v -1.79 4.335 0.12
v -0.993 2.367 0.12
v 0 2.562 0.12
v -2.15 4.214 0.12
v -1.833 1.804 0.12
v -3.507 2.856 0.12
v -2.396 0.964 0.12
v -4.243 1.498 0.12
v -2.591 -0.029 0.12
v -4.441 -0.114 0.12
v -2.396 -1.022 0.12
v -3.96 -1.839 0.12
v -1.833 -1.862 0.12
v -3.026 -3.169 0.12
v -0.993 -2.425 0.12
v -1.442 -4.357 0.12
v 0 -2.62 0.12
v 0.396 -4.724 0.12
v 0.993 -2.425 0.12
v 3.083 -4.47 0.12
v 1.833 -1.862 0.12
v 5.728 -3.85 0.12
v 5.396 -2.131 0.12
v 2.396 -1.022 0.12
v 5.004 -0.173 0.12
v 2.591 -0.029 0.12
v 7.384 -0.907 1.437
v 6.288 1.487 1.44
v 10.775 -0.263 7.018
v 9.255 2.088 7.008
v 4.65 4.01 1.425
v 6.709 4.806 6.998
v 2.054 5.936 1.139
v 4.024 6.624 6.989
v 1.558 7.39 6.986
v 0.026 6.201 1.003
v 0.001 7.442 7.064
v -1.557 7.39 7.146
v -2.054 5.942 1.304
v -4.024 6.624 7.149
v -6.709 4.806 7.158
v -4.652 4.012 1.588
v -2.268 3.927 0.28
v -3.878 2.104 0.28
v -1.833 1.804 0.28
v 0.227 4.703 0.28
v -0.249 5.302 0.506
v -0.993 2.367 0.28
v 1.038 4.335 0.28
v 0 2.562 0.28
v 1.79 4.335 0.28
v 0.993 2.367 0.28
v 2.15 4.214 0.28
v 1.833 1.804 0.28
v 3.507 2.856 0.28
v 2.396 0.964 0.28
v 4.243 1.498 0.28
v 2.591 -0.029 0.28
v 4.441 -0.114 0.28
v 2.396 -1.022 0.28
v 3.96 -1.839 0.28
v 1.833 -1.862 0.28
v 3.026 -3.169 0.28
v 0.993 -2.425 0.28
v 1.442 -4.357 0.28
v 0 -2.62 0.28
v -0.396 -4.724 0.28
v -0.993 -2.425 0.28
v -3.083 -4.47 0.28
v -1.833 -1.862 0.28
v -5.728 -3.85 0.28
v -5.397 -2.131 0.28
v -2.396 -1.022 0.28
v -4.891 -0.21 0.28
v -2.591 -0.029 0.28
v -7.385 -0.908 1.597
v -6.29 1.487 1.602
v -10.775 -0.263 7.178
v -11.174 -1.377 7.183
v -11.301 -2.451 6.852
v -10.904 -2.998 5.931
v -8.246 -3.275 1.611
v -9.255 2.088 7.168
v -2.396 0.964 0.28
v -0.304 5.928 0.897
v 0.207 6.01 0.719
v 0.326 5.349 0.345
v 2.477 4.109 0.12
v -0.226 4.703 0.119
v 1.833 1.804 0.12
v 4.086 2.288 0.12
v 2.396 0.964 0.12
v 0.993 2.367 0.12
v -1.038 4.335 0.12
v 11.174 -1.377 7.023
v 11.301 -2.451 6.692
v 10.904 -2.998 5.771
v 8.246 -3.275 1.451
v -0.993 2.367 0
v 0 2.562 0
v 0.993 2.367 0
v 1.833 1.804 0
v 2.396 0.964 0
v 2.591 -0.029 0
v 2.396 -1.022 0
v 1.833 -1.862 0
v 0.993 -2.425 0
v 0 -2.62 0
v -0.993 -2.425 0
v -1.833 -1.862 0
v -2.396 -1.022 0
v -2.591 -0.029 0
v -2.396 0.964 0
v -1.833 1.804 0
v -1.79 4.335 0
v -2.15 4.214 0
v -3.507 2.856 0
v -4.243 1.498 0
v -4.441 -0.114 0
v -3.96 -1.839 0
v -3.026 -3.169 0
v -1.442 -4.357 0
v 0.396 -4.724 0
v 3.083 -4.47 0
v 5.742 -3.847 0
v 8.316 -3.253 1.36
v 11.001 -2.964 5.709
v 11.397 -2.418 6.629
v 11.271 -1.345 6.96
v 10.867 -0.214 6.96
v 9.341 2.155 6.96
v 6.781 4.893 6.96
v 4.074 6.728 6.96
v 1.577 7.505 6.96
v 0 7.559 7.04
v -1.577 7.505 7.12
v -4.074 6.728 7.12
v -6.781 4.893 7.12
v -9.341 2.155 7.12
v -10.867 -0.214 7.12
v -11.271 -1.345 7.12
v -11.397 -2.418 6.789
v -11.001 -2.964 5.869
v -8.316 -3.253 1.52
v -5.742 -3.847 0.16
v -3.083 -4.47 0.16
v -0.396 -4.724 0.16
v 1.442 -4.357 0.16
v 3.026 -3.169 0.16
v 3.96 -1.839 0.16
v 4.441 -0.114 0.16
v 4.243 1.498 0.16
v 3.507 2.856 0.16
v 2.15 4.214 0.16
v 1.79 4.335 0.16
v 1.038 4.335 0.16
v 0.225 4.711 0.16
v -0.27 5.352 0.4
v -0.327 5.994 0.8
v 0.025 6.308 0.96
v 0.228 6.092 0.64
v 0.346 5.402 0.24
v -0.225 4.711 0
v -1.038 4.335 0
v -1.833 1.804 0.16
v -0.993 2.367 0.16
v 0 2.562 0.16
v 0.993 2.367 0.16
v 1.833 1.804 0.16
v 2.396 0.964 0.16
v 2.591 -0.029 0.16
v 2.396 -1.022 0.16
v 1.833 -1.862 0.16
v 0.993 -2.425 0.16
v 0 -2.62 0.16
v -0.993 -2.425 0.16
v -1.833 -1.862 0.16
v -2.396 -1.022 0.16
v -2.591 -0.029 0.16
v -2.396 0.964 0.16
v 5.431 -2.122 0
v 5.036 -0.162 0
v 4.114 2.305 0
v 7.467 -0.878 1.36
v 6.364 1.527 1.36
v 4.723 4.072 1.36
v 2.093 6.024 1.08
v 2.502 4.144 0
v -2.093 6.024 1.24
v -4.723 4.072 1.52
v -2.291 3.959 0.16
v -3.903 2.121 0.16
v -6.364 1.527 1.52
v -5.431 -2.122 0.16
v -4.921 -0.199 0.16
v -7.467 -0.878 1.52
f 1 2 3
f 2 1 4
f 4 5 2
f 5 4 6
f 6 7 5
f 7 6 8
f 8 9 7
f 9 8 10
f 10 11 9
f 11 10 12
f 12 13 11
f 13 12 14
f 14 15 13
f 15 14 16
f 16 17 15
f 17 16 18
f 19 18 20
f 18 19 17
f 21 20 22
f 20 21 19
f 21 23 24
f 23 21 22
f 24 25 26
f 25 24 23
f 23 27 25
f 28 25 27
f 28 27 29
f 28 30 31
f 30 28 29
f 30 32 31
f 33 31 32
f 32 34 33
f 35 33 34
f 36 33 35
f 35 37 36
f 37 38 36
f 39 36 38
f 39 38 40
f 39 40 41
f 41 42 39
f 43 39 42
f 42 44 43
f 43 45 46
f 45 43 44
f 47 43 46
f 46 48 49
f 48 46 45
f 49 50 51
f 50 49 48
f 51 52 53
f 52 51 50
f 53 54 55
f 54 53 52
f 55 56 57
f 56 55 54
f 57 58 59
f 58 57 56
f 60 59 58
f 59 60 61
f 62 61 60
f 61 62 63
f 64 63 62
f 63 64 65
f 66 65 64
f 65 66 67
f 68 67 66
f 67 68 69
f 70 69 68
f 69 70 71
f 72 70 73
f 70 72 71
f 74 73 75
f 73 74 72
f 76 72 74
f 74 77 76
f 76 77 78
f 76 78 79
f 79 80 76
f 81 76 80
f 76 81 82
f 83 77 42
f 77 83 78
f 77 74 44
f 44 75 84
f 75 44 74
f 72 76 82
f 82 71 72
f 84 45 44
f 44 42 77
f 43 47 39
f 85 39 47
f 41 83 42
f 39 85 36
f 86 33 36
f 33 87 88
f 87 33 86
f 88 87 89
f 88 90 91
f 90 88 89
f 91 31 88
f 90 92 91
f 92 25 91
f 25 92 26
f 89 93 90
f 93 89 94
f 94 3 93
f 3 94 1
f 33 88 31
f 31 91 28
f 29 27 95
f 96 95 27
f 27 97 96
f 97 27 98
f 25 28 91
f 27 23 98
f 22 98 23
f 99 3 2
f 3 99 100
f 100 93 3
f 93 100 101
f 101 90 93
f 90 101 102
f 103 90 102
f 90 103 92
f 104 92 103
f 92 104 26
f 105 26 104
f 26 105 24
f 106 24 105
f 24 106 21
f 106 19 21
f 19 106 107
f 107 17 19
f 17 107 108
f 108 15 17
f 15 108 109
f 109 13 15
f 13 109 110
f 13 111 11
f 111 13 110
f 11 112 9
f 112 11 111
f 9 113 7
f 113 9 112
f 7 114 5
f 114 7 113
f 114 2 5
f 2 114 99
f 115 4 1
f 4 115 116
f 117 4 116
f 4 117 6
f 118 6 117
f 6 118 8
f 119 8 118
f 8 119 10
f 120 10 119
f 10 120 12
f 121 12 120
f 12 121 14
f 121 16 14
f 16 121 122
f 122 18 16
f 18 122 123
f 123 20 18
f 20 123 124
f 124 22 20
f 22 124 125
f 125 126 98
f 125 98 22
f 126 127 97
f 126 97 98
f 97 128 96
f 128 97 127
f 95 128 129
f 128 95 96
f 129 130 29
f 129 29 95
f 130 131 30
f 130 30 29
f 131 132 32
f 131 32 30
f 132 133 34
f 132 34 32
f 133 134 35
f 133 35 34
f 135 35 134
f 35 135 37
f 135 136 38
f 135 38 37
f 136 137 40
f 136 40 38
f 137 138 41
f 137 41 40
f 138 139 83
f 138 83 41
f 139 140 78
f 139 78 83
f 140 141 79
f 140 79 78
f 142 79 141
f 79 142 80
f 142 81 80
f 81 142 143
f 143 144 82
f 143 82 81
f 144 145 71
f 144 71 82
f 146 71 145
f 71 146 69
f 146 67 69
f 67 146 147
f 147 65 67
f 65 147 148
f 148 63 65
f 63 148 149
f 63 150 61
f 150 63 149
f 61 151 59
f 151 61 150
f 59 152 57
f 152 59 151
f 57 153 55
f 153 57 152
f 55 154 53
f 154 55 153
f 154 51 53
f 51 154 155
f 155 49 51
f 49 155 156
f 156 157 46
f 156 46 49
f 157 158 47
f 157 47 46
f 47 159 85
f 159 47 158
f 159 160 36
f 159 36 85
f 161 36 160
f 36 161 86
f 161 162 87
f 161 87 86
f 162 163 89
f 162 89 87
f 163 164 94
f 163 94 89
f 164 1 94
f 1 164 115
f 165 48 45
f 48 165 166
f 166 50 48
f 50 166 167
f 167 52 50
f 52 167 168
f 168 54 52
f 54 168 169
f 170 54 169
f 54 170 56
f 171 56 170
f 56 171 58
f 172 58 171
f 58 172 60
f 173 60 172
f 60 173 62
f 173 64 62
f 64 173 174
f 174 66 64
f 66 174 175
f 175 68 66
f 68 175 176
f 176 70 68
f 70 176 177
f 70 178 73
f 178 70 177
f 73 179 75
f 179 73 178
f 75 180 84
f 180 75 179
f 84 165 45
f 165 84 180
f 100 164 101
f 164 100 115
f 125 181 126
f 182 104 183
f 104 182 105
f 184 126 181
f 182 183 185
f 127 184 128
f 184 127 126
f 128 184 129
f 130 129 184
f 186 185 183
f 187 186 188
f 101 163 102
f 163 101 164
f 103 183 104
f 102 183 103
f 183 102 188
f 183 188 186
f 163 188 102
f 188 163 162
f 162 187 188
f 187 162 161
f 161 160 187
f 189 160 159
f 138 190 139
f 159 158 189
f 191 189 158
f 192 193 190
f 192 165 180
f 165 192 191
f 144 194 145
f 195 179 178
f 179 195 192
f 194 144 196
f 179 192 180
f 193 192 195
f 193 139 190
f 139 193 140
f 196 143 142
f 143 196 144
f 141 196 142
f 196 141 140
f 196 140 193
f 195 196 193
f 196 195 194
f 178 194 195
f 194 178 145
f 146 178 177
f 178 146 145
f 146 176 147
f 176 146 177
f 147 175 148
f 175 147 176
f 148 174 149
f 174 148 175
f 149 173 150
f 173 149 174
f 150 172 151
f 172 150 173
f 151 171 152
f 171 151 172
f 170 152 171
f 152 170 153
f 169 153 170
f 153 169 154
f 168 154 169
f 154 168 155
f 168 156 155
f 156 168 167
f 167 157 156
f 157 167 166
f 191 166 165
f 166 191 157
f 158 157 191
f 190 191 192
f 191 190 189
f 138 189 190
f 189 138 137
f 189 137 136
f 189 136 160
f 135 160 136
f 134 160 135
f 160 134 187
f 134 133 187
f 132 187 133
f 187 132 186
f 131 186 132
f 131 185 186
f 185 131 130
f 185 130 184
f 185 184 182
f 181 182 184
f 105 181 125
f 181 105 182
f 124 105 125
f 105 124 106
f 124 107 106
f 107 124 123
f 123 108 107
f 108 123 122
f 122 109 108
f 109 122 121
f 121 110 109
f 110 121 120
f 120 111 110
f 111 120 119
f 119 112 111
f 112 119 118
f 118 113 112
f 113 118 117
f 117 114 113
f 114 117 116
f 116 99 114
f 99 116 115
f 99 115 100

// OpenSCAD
use <../lib.scad>
use <s/20551c01s01.scad>
use <s/20551c01s02.scad>
$fa=1; $fs=0.2;
function ldraw_lib__20551c01(realsolid=false) = [
// 0 Minifig Cape Cloth High Rounded Collar (Formed)
// 0 Name: 20551c01.dat
// 0 Author: Philippe Hurbain [Philo]
// 0 !LDRAW_ORG Part UPDATE 2020-03
// 0 !LICENSE Licensed under CC BY 2.0 and CC BY 4.0 : see CAreadme.txt
// 
// 0 BFC CERTIFY CCW
  [0,"BFC","CERTIFY"],
  [0,"BFC","CCW"],
// 
// 0 !CATEGORY Sheet Fabric
// 0 !KEYWORDS Cloak, Neckwear
// 
// 0 !HISTORY 2020-12-29 [PTadmin] Official Update 2020-03
// 
// 
// 1 16 0 0 0 1 0 0 0 1 0 0 0 1 s\20551c01s01.dat
  [1,16,0,0,0,1,0,0,0,1,0,0,0,1, ldraw_lib__s__20551c01s01(realsolid)],
// 1 16 0 0 0 1 0 0 0 1 0 0 0 1 s\20551c01s02.dat
  [1,16,0,0,0,1,0,0,0,1,0,0,0,1, ldraw_lib__s__20551c01s02(realsolid)],
];
module ldraw_lib__20551c01(step=0, col=false, unit=2/5, alt=false, line=0.2, solid=!$preview)
    makepoly(ldraw_lib__20551c01(solid), step=step, col=col, unit=unit, alt=alt, line=line, solid=solid);
ldraw_lib__20551c01(line=0.2);
